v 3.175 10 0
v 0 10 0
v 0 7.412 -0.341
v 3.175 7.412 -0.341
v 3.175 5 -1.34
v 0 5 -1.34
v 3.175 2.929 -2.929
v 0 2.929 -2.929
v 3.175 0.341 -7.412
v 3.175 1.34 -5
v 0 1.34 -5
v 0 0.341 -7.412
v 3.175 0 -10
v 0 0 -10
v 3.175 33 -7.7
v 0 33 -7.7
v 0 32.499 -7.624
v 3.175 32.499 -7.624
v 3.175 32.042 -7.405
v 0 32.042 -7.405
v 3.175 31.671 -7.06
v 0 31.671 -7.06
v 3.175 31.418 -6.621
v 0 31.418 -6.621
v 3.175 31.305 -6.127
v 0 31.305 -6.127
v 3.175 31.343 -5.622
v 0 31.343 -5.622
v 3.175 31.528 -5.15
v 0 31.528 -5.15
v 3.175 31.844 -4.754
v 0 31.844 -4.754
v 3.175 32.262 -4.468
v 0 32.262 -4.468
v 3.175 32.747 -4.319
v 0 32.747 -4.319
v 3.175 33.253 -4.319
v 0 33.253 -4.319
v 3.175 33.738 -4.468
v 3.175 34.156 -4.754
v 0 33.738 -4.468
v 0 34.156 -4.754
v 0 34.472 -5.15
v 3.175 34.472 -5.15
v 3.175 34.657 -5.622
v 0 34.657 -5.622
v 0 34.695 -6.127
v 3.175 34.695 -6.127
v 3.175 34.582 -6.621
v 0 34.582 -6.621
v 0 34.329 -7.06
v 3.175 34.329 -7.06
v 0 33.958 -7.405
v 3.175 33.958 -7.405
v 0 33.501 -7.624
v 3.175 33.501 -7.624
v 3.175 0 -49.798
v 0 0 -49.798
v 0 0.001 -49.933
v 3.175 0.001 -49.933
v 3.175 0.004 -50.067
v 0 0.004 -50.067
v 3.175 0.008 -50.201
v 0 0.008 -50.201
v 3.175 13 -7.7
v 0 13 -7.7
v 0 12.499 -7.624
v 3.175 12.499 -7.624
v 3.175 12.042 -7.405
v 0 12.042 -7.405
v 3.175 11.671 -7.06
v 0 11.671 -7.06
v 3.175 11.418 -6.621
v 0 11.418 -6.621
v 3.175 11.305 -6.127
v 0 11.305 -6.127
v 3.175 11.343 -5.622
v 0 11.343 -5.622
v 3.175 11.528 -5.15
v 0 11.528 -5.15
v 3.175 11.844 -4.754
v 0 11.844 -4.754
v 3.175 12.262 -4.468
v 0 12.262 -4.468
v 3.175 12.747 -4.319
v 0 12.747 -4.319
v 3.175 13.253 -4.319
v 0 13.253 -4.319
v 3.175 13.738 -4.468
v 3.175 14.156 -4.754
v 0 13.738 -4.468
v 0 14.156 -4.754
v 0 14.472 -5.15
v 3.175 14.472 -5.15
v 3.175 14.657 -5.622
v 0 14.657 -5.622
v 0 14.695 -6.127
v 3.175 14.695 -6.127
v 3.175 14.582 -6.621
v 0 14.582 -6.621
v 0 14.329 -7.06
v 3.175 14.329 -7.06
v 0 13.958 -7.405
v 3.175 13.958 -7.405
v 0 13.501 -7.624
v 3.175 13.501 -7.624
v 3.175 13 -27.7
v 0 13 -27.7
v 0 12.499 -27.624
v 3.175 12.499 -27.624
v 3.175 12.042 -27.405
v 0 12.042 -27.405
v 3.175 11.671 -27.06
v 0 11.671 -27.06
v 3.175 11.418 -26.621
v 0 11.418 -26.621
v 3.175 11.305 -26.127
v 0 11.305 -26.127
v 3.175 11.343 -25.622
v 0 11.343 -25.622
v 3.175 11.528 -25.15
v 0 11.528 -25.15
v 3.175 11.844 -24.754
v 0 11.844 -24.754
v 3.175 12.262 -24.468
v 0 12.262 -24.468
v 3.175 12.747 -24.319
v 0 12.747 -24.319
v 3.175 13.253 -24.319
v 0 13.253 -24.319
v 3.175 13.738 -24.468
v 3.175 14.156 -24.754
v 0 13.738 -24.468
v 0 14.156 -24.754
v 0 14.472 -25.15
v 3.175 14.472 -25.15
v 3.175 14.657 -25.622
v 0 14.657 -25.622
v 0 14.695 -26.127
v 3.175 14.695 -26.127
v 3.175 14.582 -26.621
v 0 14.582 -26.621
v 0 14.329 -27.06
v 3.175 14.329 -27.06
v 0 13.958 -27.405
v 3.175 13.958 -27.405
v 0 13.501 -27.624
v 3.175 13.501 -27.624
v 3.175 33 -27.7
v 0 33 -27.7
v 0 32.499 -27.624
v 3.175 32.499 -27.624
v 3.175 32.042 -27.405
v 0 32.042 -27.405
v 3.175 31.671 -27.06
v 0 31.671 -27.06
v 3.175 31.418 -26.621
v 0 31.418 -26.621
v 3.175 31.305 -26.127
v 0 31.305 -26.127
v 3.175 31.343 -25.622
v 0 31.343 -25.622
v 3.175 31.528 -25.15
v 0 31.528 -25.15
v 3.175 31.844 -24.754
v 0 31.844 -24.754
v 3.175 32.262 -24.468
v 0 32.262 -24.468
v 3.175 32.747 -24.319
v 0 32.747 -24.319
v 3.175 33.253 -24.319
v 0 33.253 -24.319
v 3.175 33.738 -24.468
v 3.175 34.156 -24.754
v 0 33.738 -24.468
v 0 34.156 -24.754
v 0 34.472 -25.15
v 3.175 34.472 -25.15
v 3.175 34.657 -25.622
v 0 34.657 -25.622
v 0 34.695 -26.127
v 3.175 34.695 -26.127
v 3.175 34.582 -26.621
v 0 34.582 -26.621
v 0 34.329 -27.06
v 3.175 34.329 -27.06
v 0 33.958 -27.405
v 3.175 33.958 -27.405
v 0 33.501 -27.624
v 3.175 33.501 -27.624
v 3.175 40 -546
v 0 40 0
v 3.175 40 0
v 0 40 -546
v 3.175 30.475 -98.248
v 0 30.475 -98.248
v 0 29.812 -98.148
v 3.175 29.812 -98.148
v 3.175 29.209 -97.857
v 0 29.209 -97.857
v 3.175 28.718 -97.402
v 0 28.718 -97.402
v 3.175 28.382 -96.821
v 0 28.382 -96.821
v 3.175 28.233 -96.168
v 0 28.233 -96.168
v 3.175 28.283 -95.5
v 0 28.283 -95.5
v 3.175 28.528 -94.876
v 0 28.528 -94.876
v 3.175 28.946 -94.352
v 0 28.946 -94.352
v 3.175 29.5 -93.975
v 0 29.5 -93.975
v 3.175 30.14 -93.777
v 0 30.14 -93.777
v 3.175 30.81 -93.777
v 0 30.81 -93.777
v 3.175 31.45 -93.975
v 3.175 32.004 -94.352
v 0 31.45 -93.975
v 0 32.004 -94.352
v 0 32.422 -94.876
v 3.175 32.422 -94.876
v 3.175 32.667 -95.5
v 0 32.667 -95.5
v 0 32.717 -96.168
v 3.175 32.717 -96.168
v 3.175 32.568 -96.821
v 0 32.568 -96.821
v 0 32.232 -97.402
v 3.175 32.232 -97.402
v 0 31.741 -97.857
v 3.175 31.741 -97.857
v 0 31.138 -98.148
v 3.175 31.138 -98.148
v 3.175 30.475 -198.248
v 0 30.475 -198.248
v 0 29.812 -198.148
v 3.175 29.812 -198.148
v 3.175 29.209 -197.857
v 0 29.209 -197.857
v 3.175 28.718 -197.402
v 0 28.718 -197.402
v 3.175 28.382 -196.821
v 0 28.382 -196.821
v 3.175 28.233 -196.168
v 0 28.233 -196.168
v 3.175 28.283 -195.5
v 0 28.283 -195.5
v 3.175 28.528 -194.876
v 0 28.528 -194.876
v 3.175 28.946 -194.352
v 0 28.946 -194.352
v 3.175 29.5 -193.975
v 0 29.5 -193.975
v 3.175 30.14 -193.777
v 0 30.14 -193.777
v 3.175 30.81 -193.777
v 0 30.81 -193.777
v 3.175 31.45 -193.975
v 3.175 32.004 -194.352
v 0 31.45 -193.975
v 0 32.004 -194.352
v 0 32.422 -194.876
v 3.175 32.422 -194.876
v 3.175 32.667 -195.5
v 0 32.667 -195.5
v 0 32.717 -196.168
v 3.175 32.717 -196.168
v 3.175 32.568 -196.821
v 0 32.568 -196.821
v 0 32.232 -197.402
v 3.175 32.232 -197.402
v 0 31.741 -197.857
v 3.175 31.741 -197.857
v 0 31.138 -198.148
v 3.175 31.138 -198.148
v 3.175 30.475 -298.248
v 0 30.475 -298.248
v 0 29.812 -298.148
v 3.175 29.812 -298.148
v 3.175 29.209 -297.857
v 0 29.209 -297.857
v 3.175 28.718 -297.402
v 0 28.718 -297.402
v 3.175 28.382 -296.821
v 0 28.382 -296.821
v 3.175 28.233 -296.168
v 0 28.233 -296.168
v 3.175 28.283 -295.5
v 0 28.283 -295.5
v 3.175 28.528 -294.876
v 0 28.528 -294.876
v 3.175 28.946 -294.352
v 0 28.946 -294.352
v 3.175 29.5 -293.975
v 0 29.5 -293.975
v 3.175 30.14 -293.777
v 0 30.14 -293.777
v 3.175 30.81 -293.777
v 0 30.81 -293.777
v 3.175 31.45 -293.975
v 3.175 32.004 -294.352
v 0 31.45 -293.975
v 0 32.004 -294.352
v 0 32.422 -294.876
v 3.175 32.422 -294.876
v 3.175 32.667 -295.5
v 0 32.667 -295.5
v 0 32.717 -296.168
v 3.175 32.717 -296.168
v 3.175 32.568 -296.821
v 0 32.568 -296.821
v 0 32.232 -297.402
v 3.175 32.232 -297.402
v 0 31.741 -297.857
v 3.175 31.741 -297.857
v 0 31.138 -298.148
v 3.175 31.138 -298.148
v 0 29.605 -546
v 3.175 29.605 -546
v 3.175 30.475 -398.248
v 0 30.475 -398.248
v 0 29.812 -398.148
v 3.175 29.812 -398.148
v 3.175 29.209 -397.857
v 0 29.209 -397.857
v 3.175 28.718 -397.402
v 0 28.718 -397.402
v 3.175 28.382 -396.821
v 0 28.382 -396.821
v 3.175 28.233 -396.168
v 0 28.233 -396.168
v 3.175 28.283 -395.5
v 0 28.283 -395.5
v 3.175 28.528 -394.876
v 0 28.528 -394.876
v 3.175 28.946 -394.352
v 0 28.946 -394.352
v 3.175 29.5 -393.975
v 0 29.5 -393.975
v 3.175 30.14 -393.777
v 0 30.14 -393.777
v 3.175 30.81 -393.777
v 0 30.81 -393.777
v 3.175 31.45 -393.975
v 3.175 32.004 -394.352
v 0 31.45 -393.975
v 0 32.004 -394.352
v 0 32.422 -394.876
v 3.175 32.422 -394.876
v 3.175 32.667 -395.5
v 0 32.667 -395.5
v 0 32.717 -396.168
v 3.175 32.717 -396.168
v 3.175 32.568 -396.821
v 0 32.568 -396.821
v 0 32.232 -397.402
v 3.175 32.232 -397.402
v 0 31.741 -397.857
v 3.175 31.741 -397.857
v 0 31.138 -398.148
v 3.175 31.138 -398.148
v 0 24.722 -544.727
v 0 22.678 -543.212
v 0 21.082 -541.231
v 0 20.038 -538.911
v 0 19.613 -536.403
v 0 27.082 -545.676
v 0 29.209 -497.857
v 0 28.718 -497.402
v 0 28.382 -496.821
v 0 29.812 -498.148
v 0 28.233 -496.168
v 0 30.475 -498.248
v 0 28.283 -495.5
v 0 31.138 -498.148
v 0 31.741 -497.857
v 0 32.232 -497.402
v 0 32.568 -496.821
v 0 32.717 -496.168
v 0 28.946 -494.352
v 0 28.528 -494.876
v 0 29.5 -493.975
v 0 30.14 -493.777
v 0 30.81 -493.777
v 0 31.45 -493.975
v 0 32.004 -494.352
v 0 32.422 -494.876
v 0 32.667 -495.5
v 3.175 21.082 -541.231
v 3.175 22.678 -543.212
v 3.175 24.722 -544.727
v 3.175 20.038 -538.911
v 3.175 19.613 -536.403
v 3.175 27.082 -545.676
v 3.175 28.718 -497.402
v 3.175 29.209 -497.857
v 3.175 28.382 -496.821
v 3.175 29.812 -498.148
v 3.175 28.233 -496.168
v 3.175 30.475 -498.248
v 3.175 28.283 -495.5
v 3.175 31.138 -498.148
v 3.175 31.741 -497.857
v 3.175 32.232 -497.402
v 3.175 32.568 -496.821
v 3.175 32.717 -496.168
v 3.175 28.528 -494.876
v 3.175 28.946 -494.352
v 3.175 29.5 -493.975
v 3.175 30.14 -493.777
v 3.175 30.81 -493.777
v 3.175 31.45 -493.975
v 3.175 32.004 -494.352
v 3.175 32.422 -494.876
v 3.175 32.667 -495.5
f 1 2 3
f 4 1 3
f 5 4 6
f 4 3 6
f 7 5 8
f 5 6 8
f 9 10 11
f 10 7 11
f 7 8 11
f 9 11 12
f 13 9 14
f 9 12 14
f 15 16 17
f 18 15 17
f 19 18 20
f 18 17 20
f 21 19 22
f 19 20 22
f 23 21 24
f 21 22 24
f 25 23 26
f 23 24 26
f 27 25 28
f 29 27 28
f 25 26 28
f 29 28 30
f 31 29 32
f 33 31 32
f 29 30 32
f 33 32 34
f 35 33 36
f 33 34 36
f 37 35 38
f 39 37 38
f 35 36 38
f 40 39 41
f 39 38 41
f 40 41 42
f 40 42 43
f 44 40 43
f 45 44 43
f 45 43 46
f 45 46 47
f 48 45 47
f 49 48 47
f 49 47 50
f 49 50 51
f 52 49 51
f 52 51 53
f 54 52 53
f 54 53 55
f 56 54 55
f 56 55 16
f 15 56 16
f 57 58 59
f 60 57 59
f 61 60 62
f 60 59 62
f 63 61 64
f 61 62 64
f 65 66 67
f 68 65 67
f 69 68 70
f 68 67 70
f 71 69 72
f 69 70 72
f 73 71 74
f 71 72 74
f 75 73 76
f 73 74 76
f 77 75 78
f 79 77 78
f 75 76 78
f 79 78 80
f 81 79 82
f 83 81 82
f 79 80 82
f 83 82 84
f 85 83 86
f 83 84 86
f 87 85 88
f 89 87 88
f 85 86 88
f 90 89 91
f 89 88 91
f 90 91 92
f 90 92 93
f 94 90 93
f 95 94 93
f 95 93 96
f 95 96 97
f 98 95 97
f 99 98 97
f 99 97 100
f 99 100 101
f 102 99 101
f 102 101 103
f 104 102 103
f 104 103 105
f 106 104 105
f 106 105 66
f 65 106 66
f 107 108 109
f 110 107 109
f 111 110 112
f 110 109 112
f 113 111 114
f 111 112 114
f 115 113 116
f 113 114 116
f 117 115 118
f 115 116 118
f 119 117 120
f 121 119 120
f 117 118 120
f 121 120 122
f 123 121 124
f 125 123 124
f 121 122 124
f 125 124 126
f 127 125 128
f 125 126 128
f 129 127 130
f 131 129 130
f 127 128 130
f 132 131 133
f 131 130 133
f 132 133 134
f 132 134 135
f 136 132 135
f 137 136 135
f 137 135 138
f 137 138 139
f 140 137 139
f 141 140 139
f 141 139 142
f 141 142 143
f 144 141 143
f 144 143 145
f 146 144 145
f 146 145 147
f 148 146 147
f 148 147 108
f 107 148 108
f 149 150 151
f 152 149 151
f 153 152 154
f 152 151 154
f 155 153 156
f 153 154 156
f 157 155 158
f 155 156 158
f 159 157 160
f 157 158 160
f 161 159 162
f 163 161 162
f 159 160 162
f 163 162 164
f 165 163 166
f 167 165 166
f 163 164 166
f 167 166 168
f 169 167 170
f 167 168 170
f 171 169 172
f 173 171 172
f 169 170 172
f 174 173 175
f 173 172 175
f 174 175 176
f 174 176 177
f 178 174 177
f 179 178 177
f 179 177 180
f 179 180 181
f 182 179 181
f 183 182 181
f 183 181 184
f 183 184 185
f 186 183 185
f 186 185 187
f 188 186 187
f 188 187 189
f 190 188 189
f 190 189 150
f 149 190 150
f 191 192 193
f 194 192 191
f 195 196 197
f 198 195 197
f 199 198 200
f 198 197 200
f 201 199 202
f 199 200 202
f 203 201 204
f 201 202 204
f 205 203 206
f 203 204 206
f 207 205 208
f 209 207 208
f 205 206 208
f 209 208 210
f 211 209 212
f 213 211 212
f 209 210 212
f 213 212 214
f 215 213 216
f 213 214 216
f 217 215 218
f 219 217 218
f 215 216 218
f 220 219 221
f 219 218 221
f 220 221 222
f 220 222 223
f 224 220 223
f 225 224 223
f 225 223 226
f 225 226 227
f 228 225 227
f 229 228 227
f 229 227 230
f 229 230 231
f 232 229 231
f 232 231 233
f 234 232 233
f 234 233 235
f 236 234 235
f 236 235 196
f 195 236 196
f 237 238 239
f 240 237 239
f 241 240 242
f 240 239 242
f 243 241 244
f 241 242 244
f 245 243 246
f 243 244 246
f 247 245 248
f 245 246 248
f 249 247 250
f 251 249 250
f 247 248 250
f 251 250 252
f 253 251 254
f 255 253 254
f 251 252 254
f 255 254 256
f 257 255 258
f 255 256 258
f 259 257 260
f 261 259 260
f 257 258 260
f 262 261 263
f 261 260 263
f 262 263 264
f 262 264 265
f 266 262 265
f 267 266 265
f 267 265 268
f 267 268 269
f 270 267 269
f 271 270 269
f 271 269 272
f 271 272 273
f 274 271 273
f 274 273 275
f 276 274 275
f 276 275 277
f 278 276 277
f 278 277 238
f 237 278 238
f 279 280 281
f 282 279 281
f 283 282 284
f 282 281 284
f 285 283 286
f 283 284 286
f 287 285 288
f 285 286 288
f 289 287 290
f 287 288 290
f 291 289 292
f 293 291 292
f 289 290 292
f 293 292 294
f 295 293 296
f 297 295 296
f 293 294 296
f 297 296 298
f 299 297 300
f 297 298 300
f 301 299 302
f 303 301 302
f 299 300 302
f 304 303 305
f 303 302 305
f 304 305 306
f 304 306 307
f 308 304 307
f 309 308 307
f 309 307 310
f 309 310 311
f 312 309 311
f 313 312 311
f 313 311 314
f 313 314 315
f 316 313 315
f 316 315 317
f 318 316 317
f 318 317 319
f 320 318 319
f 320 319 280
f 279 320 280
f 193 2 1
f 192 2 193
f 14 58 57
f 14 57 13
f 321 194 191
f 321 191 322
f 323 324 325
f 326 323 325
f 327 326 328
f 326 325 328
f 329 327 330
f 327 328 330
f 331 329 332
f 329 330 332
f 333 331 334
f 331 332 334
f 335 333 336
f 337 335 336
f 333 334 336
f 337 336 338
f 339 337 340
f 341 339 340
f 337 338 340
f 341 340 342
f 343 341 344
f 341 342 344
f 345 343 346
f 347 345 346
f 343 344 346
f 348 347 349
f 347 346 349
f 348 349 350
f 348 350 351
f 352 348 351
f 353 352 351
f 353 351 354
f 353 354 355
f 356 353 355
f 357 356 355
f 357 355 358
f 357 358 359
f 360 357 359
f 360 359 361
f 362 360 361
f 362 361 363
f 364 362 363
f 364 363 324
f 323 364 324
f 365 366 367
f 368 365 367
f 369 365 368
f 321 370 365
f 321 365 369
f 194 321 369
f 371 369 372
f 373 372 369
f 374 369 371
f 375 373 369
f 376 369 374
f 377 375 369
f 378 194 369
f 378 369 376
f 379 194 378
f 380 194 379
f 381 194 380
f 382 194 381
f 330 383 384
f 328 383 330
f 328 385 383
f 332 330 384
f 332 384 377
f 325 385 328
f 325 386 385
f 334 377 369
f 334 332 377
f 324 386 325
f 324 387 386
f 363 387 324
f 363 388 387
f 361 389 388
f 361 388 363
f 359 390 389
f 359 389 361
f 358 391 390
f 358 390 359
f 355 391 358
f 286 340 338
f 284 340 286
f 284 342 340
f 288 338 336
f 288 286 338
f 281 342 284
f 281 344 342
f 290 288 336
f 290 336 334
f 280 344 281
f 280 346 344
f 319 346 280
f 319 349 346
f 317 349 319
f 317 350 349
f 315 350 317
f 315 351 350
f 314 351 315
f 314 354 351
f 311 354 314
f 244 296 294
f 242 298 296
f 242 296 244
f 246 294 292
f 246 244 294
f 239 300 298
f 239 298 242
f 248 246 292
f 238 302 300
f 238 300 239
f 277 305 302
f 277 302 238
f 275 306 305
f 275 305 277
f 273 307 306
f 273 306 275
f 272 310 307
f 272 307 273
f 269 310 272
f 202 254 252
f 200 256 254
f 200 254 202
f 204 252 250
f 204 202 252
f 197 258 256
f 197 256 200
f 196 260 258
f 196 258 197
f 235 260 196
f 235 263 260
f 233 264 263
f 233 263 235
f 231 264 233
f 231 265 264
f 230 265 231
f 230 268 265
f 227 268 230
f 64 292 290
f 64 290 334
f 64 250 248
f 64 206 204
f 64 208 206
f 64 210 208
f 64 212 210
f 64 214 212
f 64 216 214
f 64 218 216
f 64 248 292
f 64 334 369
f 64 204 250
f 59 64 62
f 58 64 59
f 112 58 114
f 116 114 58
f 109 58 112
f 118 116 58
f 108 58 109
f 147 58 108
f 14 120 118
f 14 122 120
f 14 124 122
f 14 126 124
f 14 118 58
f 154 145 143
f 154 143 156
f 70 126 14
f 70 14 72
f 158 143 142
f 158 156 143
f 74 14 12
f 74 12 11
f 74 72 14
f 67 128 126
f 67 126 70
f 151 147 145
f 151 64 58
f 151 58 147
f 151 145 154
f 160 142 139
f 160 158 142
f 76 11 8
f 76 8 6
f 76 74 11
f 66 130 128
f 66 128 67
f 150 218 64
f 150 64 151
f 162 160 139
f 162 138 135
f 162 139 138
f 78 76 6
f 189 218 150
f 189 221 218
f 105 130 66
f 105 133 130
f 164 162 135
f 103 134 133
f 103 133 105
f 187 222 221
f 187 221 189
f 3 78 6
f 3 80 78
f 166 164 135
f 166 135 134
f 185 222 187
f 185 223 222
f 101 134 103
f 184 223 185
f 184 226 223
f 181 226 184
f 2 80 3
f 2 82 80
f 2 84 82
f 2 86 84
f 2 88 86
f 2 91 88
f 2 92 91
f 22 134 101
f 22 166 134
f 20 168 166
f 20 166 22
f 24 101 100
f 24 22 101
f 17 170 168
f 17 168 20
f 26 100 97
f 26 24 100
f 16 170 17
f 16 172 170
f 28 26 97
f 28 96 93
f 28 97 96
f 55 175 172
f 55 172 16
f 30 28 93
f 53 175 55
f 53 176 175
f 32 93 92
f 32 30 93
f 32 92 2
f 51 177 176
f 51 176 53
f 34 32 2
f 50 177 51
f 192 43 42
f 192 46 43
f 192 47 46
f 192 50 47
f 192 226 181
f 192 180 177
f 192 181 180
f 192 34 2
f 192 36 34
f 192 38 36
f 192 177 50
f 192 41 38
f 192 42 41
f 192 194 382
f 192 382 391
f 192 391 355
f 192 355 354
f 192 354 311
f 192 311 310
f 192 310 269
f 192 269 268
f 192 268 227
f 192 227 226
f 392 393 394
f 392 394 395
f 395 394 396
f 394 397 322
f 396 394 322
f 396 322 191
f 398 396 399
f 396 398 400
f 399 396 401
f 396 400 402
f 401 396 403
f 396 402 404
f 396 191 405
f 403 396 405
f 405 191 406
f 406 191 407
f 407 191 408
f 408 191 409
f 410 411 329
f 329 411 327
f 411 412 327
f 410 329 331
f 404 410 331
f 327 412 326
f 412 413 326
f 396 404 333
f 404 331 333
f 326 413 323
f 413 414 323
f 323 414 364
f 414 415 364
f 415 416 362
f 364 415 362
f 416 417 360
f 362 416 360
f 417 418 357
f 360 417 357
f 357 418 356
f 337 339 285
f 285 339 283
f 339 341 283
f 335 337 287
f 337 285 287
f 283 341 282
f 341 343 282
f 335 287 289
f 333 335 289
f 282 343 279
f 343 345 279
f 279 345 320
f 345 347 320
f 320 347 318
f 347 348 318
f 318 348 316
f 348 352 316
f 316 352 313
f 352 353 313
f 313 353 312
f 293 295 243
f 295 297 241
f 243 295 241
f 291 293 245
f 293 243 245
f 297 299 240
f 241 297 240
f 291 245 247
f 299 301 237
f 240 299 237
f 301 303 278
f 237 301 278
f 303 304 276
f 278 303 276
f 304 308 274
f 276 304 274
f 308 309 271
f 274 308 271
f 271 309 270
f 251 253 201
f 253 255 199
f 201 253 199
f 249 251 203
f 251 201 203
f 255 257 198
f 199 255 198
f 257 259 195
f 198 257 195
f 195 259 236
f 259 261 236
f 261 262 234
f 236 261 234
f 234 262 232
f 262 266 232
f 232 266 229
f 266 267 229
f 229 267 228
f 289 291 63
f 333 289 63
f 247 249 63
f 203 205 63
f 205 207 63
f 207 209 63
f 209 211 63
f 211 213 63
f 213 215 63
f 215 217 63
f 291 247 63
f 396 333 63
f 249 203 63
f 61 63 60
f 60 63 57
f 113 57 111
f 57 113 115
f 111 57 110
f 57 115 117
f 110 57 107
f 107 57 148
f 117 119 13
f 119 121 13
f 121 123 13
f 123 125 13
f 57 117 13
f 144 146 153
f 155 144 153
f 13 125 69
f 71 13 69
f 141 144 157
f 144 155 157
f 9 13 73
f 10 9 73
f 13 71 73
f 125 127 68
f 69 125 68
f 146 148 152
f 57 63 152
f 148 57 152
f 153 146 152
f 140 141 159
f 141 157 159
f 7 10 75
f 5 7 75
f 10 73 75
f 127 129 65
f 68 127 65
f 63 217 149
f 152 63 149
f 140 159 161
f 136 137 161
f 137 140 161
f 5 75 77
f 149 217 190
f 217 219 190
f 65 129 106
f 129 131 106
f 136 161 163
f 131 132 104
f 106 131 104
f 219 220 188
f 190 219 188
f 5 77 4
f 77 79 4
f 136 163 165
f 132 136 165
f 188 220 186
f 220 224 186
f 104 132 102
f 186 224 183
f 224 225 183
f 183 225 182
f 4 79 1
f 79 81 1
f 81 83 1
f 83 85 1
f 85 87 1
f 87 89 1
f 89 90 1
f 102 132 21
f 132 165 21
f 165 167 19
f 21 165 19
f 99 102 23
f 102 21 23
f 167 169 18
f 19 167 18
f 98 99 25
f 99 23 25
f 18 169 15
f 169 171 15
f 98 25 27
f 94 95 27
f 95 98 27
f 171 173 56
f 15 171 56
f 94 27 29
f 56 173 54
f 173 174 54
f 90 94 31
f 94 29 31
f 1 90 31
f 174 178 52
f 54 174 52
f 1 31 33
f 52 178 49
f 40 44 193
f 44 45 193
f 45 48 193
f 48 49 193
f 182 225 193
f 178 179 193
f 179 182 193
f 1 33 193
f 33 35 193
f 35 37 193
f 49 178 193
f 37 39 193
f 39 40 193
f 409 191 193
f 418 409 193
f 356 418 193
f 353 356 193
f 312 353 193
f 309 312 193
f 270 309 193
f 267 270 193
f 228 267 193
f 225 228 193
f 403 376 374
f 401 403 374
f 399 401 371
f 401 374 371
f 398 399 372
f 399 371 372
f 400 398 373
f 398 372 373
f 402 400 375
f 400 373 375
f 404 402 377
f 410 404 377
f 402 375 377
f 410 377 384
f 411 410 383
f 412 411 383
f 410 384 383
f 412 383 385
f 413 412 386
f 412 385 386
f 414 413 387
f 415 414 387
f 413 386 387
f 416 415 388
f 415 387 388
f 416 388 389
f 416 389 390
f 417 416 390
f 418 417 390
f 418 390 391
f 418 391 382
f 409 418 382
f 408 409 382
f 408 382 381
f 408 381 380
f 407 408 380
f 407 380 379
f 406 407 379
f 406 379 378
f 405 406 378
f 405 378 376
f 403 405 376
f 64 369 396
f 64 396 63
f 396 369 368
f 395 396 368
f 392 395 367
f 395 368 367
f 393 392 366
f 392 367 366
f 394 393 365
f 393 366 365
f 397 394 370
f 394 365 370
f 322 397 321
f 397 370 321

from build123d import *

# Parameters (mm, degrees)
BOSS_EXTRUDE1_DEPTH   = 3.175
M3_CLEARANCE_HOLE1_D  = 3.4
FILLET1_R             = 10
F_8_CLEARANCE_HOLE1_D = 4.4958
LPATTERN1_COUNT       = 5
LPATTERN1_PITCH       = 100


with BuildPart() as part:
    # Sketch1 → Boss-Extrude1 (new body)
    with BuildSketch(Plane(origin=(0, 0, 0), x_dir=(0, 0, -1), z_dir=(1, 0, 0))):
        Polygon((0, 0), (0, 40), (546, 40), (546, 20), (50, 0), align=None)
    extrude(amount=BOSS_EXTRUDE1_DEPTH)

    # M3 Clearance Hole1 (through all)
    with Locations(Plane(origin=(3.175, 33, -26), x_dir=(0, 0, 1), z_dir=(1, 0, 0))):
        with Locations((0, 0), (20, 0), (0, 20), (20, 20)):
            Hole(M3_CLEARANCE_HOLE1_D / 2)

    # Fillet1
    # the kernel refuses this fillet: 10 mm, written as the material it takes off along each edge
    with BuildSketch(Plane(origin=(-25, 0, 0), x_dir=(0, 1, 0), z_dir=(1, 0, 0))) as fillet1_piece_1:
        with BuildLine():
            CenterArc((FILLET1_R, -FILLET1_R), FILLET1_R, 90, 90)
            Line((0, -FILLET1_R), (0, 0))
            Line((0, 0), (FILLET1_R, 0))
        make_face()
    extrude(amount=53.175, mode=Mode.SUBTRACT)
    with BuildSketch(Plane(origin=(-24.012251111, 20, -546), x_dir=(0, -0.04028984011081184, 0.9991880347481376), z_dir=(1, 0, 0))) as fillet1_piece_2:
        with BuildLine():
            CenterArc((FILLET1_R * 0.96049004443, -FILLET1_R), FILLET1_R, 90, 87.690937211)
            Line((-FILLET1_R * 0.0386979903181, -FILLET1_R * 0.959710159889), (0, 0))
            Line((0, 0), (FILLET1_R * 0.96049004443, 0))
        make_face()
    extrude(amount=51.199502222, mode=Mode.SUBTRACT)
    with BuildSketch(Plane(origin=(-0.503827547, 0, -50), x_dir=(0, 0, 1), z_dir=(1, 0, 0))) as fillet1_piece_3:
        with BuildLine():
            CenterArc((FILLET1_R * 0.0201531018646, -FILLET1_R), FILLET1_R, 90, 2.309062789)
            Line((-FILLET1_R * 0.0201367382462, -FILLET1_R * 0.000811965251862), (0, 0))
            Line((0, 0), (FILLET1_R * 0.0201531018646, 0))
        make_face()
    extrude(amount=4.182655093, mode=Mode.SUBTRACT)

    # #8 Clearance Hole1 (through all)
    with Locations(Plane(origin=(3.175, 30.475, -496), x_dir=(0, 0, 1), z_dir=(1, 0, 0))):
        with Locations((0, 0)):
            f_8_clearance_hole1 = Hole(F_8_CLEARANCE_HOLE1_D / 2)

    # LPattern1: #8 Clearance Hole1 ×5
    with Locations(*[(0, 0, i * LPATTERN1_PITCH) for i in range(1, LPATTERN1_COUNT)]):
        add(f_8_clearance_hole1, mode=Mode.SUBTRACT)


solid = part.part
